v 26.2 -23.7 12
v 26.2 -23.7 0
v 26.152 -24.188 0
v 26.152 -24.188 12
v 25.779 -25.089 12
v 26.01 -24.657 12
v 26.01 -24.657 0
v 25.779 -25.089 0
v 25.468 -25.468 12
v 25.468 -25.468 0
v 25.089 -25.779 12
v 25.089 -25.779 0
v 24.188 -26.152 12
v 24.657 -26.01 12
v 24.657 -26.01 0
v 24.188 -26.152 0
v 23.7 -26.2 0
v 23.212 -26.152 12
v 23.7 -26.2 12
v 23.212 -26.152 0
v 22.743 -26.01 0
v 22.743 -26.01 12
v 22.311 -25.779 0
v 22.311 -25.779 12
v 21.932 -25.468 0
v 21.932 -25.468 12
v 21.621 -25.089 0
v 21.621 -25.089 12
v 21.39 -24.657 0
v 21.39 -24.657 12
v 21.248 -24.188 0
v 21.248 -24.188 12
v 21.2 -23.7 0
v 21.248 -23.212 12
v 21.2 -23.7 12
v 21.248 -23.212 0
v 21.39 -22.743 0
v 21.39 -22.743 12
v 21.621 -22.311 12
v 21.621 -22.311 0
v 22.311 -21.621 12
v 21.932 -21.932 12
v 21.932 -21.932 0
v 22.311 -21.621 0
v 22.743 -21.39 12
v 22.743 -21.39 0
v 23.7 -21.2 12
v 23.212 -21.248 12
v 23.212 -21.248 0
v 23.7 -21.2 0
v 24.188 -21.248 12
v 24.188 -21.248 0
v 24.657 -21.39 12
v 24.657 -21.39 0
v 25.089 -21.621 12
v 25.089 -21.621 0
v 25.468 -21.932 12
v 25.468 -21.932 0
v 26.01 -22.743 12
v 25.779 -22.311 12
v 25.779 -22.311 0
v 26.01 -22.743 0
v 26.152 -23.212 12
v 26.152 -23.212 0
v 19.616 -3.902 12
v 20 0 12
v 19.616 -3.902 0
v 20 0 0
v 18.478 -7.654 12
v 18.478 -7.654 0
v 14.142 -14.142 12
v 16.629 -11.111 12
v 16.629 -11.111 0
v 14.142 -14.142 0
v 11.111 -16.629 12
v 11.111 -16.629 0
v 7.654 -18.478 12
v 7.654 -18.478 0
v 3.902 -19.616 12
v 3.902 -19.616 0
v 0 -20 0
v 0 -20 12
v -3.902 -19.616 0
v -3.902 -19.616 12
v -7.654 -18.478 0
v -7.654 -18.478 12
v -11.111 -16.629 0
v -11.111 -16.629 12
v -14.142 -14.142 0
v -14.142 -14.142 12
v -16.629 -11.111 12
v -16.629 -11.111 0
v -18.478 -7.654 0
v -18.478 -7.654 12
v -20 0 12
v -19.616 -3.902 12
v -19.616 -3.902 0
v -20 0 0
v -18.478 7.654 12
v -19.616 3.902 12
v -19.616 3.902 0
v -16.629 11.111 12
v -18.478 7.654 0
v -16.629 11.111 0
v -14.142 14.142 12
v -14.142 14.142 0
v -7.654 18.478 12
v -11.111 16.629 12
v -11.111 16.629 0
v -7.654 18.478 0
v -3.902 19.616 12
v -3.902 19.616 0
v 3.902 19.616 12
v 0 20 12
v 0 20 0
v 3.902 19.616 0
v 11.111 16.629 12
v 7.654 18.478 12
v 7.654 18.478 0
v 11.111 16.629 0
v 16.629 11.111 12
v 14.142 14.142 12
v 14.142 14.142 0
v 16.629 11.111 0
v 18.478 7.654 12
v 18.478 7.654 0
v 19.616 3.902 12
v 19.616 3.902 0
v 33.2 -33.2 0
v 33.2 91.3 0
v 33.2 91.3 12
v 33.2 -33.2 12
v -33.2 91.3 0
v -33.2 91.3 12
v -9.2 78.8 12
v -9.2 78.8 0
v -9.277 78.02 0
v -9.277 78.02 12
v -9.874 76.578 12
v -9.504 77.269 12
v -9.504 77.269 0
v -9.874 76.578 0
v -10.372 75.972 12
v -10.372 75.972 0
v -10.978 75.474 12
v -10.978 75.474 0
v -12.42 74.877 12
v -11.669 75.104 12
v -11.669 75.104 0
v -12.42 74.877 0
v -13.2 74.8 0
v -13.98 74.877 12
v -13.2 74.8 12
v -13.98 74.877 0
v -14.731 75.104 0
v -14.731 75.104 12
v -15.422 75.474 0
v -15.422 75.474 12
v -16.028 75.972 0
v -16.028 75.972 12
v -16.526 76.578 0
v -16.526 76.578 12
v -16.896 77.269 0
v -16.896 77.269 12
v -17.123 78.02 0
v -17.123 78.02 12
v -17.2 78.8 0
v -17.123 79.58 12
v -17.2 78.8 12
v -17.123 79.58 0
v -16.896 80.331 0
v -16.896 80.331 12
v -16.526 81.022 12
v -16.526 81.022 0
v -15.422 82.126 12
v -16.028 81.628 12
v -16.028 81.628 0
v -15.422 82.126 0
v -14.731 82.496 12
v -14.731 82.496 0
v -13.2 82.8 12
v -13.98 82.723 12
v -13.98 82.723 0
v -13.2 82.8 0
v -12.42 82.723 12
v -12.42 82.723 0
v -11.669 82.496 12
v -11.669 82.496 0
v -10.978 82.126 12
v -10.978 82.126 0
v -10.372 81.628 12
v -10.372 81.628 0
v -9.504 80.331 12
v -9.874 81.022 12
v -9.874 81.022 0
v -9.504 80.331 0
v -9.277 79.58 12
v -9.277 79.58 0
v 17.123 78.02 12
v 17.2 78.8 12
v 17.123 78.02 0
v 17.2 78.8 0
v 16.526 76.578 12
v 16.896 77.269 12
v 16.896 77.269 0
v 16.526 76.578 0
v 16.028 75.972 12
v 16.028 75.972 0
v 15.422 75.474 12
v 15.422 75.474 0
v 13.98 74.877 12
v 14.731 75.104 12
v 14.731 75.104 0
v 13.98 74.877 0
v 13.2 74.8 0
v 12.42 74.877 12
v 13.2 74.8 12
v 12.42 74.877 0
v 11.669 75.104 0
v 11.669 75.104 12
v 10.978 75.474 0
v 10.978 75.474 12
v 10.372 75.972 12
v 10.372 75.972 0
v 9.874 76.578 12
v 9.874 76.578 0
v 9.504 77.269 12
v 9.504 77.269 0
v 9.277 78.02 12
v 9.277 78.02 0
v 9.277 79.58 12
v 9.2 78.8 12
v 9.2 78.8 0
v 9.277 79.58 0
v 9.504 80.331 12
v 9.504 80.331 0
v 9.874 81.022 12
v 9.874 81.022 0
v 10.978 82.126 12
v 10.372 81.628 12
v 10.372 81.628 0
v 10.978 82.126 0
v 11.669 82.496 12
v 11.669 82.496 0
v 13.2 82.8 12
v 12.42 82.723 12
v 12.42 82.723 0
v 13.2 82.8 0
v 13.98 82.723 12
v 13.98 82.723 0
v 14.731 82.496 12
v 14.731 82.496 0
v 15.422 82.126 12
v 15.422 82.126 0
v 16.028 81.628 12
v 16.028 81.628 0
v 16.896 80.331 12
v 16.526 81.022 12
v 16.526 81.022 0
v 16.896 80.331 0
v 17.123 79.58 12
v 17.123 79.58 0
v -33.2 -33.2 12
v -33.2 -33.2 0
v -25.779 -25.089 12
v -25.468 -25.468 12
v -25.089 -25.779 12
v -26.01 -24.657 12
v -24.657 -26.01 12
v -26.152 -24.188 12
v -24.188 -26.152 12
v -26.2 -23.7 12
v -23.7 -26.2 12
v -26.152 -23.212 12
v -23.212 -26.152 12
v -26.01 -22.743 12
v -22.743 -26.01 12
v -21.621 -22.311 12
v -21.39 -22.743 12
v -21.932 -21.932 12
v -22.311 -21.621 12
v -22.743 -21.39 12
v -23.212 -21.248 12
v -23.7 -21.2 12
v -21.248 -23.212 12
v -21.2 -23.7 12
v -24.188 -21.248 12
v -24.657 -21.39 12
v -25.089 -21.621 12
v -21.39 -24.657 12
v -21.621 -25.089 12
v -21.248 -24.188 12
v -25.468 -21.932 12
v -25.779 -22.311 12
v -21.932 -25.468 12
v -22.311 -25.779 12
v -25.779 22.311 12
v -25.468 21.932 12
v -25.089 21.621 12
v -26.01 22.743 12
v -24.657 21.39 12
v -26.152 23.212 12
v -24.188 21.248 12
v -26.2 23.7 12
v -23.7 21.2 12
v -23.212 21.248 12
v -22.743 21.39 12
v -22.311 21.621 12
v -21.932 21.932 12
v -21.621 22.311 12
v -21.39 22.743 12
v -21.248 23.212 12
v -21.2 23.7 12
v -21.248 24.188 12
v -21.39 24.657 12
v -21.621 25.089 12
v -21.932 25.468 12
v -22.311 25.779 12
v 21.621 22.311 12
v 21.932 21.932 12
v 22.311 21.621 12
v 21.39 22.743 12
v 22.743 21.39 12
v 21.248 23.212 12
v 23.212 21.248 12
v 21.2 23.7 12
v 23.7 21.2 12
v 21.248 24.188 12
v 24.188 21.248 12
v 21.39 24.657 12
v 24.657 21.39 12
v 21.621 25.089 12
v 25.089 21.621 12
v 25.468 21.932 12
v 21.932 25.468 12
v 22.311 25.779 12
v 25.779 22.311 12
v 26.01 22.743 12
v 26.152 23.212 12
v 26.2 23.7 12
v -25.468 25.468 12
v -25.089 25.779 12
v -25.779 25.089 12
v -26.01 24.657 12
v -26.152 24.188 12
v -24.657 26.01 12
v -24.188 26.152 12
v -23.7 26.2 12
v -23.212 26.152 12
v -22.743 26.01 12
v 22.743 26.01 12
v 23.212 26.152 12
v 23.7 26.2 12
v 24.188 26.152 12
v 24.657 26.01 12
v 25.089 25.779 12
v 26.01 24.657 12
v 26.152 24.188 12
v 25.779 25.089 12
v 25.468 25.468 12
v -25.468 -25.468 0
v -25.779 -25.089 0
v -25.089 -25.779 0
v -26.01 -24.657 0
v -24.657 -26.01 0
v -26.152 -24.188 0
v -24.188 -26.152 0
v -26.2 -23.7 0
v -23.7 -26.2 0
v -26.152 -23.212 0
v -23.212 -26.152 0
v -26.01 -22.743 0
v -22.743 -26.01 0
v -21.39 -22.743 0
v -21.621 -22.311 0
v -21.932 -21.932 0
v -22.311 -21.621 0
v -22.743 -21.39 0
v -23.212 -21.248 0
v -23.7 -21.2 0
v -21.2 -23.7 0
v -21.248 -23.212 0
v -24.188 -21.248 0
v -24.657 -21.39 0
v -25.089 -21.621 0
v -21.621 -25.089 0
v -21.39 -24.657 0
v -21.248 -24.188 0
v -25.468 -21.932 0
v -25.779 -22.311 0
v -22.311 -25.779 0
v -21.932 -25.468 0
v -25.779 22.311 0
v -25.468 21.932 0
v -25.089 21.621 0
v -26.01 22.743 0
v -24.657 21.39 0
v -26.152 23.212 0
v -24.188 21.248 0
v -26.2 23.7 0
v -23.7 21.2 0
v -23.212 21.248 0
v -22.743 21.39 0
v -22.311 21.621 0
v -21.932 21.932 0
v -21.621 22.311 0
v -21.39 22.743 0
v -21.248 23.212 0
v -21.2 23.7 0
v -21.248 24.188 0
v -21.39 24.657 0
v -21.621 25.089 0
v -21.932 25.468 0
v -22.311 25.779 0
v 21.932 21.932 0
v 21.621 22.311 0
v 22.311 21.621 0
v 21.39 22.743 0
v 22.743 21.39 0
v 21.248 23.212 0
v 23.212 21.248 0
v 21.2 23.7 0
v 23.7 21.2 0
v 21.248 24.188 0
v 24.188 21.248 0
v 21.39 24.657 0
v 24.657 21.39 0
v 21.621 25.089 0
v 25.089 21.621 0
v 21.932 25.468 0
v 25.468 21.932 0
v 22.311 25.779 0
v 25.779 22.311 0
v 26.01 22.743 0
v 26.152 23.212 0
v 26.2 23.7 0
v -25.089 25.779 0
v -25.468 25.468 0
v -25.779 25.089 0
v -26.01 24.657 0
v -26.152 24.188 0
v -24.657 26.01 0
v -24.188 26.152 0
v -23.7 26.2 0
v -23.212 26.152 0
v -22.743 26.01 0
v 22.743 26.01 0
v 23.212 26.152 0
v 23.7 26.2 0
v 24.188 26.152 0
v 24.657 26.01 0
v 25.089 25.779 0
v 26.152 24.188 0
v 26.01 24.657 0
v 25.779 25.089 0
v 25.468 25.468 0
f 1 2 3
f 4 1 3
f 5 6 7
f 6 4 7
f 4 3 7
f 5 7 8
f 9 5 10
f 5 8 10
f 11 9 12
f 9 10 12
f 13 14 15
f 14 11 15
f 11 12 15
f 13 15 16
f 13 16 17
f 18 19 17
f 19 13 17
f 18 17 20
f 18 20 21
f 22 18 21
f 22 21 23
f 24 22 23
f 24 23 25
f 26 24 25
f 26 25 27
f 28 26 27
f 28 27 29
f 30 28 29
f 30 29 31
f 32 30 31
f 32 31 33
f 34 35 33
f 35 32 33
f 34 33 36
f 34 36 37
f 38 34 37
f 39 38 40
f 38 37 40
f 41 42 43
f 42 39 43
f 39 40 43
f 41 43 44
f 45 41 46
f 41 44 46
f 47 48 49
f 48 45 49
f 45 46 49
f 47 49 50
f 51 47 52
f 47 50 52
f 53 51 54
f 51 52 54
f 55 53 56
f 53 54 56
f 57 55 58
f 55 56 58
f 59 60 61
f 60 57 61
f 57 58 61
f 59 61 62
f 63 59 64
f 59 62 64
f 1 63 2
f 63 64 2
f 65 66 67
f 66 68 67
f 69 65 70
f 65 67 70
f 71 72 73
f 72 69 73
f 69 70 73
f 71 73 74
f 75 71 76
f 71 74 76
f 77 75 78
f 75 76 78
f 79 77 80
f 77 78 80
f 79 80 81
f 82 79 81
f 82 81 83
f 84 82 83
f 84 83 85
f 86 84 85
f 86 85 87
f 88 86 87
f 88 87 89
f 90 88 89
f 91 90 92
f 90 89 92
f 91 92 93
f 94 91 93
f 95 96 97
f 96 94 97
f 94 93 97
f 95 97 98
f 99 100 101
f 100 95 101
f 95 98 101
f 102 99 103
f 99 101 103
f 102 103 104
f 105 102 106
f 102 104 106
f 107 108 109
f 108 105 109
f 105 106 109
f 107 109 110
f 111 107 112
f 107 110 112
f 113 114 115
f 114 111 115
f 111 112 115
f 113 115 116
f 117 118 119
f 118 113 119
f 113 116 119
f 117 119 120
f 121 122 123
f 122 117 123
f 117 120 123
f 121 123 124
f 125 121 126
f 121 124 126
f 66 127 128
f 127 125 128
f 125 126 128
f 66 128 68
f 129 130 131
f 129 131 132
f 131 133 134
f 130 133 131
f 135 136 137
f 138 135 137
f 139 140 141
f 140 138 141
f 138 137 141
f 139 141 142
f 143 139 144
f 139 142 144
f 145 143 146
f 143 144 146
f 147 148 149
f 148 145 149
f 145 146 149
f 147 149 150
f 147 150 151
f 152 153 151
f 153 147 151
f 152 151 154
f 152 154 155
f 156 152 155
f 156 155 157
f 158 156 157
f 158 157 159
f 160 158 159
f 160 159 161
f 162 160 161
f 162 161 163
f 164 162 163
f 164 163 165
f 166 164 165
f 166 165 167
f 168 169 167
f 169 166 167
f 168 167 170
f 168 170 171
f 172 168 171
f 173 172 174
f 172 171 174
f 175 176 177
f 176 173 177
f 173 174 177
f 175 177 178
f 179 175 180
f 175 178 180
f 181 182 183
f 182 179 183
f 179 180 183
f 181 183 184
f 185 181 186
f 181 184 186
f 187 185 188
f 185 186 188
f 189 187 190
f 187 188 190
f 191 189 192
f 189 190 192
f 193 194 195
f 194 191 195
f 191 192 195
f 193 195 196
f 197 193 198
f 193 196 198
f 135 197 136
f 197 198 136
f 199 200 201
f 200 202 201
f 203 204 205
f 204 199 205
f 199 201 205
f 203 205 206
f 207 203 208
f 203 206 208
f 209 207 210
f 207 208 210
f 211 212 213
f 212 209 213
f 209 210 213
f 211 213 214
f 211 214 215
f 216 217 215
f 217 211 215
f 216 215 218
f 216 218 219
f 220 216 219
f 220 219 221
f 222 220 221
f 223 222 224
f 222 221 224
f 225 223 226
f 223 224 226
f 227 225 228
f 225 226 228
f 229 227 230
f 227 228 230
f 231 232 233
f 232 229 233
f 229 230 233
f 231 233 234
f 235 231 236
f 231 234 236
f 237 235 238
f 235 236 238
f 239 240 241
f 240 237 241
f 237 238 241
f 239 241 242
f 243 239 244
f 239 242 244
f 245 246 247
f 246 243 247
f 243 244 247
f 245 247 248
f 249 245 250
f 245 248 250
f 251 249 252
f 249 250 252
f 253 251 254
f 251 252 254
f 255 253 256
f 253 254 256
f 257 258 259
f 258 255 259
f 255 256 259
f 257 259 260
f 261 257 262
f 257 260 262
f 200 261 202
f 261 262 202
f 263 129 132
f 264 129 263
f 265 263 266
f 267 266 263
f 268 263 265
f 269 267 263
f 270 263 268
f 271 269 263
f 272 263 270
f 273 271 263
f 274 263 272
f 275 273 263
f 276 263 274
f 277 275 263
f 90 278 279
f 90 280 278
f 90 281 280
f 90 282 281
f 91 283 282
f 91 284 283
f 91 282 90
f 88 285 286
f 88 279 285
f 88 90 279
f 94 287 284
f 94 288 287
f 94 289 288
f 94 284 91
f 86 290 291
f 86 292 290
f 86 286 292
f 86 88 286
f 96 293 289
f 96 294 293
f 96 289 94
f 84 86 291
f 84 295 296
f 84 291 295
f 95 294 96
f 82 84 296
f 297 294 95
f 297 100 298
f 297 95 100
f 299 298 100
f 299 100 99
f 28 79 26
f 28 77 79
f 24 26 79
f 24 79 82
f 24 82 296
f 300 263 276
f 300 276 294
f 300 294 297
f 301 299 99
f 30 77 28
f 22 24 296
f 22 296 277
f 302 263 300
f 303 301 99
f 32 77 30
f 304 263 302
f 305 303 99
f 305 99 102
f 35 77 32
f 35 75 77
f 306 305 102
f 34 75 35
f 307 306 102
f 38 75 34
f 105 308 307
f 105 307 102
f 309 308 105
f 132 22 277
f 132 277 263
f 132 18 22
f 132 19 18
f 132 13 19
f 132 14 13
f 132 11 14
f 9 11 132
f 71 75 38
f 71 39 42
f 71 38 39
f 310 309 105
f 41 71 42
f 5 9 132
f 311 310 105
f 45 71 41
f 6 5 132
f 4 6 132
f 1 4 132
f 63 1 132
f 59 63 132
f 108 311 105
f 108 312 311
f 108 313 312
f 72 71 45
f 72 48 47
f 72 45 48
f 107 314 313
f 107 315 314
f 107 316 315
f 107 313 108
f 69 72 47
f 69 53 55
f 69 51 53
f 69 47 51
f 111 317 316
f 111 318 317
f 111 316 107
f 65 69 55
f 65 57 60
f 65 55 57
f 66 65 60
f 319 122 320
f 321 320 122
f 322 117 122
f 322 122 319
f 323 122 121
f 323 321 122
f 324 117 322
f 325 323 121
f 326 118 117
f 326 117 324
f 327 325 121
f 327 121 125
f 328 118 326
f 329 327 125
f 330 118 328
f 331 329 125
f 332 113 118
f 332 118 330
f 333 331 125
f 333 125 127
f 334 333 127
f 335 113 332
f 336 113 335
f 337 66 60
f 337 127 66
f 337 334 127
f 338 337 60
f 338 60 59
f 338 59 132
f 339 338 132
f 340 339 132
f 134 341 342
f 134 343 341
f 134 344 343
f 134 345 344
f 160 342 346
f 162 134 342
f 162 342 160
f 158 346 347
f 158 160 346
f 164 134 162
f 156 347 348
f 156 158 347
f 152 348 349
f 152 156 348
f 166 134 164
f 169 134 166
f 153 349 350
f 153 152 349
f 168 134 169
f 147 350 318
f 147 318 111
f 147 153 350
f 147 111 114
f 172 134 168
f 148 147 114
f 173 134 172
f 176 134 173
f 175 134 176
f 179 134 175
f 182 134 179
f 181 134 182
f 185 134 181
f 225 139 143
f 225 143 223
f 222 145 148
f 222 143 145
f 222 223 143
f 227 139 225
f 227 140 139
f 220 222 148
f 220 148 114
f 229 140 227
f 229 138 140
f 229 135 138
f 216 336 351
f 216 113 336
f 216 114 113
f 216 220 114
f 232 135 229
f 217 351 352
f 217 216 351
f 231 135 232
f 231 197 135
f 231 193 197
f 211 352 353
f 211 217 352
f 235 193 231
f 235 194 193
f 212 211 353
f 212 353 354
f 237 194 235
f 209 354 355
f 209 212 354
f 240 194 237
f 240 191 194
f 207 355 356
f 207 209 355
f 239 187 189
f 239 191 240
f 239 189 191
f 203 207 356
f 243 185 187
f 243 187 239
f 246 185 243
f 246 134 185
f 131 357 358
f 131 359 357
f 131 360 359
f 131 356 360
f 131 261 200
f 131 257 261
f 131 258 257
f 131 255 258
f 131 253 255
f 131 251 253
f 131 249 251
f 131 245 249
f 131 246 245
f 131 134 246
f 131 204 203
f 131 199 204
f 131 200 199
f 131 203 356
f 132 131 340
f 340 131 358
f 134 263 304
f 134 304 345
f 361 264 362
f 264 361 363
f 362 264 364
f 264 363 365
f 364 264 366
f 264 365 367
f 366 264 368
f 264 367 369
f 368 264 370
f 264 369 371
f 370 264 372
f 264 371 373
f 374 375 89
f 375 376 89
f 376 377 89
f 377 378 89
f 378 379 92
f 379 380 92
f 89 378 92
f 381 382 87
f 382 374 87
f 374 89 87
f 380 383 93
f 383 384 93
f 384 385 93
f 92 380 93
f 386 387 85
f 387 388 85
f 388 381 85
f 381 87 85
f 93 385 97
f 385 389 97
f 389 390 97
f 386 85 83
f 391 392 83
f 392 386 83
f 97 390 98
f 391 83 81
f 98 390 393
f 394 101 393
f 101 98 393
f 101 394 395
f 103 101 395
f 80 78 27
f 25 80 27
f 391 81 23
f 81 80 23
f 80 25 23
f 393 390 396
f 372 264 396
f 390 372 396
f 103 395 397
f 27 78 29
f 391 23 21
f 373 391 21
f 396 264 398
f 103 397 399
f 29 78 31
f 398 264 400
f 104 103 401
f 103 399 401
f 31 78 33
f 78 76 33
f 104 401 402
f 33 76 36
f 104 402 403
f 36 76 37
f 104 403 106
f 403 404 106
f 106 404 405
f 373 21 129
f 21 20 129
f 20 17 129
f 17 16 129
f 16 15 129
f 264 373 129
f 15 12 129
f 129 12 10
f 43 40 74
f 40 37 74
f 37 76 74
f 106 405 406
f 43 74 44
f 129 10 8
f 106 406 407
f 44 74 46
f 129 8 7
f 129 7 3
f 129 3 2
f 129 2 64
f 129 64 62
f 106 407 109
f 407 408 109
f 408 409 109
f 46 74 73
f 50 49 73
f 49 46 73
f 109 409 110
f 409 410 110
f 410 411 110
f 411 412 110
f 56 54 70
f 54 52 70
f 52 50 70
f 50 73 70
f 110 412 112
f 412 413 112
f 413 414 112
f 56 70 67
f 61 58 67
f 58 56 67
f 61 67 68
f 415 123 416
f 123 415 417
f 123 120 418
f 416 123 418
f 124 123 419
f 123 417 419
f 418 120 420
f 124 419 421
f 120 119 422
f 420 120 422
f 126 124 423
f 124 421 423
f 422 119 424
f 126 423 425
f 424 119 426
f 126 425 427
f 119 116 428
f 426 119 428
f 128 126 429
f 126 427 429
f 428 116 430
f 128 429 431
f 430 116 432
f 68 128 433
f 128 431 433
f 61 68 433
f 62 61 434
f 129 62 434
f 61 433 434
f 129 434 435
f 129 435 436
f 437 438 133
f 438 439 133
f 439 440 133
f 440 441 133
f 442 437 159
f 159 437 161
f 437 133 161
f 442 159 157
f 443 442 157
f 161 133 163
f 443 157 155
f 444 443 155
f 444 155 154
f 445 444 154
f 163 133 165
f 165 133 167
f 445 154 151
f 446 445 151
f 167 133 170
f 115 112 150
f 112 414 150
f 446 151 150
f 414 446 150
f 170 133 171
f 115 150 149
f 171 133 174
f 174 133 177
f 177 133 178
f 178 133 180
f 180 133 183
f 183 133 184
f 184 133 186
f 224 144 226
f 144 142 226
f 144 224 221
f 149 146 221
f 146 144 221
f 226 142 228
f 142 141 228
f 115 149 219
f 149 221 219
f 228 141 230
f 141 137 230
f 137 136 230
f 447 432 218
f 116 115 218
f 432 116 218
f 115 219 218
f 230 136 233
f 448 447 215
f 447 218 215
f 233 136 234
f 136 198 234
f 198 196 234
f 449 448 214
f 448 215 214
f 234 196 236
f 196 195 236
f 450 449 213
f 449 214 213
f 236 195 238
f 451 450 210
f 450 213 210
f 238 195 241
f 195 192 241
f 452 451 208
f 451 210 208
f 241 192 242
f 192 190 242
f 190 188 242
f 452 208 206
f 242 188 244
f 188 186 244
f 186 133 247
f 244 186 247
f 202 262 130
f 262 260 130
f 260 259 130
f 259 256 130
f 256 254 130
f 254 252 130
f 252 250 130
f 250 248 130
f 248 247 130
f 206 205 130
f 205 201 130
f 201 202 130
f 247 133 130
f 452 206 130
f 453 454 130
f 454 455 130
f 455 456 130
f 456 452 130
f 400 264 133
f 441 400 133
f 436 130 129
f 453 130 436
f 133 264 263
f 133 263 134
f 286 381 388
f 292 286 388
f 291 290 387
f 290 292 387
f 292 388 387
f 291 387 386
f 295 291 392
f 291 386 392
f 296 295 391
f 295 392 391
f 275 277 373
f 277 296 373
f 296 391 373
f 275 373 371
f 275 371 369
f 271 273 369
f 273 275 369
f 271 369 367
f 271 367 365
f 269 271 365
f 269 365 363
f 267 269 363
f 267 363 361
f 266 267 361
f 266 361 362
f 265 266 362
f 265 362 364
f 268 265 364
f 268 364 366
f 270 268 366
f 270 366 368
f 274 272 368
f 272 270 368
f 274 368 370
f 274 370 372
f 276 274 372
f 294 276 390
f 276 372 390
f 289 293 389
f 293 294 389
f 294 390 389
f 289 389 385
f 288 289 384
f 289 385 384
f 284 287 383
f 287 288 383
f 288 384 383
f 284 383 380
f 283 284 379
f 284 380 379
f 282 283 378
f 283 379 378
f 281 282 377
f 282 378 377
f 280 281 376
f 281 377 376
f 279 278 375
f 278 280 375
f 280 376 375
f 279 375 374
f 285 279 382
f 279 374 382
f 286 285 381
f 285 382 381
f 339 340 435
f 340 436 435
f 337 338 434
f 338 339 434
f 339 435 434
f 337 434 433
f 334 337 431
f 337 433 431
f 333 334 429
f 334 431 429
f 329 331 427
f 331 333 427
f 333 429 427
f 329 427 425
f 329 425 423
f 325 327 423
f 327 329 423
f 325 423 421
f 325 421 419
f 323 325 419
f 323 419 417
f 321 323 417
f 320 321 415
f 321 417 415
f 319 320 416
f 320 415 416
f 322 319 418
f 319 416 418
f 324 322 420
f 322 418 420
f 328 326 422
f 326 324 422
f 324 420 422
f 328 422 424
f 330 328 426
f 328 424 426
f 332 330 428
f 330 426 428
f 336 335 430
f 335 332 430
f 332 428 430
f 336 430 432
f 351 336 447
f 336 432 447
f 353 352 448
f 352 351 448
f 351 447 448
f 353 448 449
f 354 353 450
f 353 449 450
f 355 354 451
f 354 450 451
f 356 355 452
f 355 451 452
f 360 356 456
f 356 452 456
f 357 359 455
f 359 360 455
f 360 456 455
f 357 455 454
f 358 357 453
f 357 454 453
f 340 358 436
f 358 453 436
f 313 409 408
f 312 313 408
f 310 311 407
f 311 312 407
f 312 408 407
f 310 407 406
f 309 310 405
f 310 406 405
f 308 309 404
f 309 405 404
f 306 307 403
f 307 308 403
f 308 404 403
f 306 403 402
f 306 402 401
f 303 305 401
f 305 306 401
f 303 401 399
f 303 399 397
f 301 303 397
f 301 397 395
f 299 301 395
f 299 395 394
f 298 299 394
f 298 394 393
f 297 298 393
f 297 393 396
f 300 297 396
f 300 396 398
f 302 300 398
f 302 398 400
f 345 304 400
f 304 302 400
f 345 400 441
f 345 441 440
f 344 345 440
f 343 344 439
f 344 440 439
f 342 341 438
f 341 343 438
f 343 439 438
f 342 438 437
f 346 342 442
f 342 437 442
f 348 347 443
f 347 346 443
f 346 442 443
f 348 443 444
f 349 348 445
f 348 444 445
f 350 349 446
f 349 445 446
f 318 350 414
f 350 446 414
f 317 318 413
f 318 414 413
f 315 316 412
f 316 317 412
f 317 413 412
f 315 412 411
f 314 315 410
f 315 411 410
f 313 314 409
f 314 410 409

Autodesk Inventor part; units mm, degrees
ref_plane "YZ Plane" through (0, 0, 0) normal (1, 0, 0) x (0, 1, 0)
ref_plane "XZ Plane" through (0, 0, 0) normal (0, 1, 0) x (-1, 0, 0)
ref_plane "XY Plane" through (0, 0, 0) normal (0, 0, 1) x (1, 0, 0)
sketch "Sketch1" plane through (0, 0, 0) normal (0, 0, 1) x (1, 0, 0)
  circle A0 centre (0, 0) radius 20
  line L0 (-33.2, 28.2) -> (33.2, 28.2)
  line L1 (33.2, 28.2) -> (33.2, -33.2)
  line L2 (33.2, -33.2) -> (-33.2, -33.2)
  line L3 (-33.2, -33.2) -> (-33.2, 28.2)
  circle A1 centre (-23.7, 23.7) radius 2.5
  circle A2 centre (23.7, 23.7) radius 2.5
  circle A3 centre (23.7, -23.7) radius 2.5
  circle A4 centre (-23.7, -23.7) radius 2.5
  line L4 (-33.2, 28.2) -> (-33.2, 91.3)
  line L5 (-33.2, 91.3) -> (33.2, 91.3)
  line L6 (33.2, 91.3) -> (33.2, 28.2)
  circle A5 centre (-13.2, 78.8) radius 4
  circle A6 centre (13.2, 78.8) radius 4
  dimension "d0" = 40
  dimension "d1" = 66.4
  dimension "d2" = 61.4
  dimension "d3" = 33.2
  dimension "d4" = 28.2
  dimension "d5" = 5
  dimension "d6" = 5
  dimension "d7" = 5
  dimension "d8" = 5
  dimension "d9" = 47.4
  dimension "d10" = 47.4
  dimension "d11" = 47.4
  dimension "d12" = 47.4
  dimension "d13" = 4.5
  dimension "d14" = 9.5
  dimension "d15" = 9.5
  dimension "d16" = 9.5
  dimension "d19" = 63.1
  dimension "d20" = 8
  dimension "d21" = 8
  dimension "d23" = 20
  dimension "d24" = 20
  dimension "d27" = 12.5
  dimension "d28" = 12.5
extrude "Extrusion1" add sketch "Sketch1" along normal blind 12
properties part number "NEMA 23 Holder"
